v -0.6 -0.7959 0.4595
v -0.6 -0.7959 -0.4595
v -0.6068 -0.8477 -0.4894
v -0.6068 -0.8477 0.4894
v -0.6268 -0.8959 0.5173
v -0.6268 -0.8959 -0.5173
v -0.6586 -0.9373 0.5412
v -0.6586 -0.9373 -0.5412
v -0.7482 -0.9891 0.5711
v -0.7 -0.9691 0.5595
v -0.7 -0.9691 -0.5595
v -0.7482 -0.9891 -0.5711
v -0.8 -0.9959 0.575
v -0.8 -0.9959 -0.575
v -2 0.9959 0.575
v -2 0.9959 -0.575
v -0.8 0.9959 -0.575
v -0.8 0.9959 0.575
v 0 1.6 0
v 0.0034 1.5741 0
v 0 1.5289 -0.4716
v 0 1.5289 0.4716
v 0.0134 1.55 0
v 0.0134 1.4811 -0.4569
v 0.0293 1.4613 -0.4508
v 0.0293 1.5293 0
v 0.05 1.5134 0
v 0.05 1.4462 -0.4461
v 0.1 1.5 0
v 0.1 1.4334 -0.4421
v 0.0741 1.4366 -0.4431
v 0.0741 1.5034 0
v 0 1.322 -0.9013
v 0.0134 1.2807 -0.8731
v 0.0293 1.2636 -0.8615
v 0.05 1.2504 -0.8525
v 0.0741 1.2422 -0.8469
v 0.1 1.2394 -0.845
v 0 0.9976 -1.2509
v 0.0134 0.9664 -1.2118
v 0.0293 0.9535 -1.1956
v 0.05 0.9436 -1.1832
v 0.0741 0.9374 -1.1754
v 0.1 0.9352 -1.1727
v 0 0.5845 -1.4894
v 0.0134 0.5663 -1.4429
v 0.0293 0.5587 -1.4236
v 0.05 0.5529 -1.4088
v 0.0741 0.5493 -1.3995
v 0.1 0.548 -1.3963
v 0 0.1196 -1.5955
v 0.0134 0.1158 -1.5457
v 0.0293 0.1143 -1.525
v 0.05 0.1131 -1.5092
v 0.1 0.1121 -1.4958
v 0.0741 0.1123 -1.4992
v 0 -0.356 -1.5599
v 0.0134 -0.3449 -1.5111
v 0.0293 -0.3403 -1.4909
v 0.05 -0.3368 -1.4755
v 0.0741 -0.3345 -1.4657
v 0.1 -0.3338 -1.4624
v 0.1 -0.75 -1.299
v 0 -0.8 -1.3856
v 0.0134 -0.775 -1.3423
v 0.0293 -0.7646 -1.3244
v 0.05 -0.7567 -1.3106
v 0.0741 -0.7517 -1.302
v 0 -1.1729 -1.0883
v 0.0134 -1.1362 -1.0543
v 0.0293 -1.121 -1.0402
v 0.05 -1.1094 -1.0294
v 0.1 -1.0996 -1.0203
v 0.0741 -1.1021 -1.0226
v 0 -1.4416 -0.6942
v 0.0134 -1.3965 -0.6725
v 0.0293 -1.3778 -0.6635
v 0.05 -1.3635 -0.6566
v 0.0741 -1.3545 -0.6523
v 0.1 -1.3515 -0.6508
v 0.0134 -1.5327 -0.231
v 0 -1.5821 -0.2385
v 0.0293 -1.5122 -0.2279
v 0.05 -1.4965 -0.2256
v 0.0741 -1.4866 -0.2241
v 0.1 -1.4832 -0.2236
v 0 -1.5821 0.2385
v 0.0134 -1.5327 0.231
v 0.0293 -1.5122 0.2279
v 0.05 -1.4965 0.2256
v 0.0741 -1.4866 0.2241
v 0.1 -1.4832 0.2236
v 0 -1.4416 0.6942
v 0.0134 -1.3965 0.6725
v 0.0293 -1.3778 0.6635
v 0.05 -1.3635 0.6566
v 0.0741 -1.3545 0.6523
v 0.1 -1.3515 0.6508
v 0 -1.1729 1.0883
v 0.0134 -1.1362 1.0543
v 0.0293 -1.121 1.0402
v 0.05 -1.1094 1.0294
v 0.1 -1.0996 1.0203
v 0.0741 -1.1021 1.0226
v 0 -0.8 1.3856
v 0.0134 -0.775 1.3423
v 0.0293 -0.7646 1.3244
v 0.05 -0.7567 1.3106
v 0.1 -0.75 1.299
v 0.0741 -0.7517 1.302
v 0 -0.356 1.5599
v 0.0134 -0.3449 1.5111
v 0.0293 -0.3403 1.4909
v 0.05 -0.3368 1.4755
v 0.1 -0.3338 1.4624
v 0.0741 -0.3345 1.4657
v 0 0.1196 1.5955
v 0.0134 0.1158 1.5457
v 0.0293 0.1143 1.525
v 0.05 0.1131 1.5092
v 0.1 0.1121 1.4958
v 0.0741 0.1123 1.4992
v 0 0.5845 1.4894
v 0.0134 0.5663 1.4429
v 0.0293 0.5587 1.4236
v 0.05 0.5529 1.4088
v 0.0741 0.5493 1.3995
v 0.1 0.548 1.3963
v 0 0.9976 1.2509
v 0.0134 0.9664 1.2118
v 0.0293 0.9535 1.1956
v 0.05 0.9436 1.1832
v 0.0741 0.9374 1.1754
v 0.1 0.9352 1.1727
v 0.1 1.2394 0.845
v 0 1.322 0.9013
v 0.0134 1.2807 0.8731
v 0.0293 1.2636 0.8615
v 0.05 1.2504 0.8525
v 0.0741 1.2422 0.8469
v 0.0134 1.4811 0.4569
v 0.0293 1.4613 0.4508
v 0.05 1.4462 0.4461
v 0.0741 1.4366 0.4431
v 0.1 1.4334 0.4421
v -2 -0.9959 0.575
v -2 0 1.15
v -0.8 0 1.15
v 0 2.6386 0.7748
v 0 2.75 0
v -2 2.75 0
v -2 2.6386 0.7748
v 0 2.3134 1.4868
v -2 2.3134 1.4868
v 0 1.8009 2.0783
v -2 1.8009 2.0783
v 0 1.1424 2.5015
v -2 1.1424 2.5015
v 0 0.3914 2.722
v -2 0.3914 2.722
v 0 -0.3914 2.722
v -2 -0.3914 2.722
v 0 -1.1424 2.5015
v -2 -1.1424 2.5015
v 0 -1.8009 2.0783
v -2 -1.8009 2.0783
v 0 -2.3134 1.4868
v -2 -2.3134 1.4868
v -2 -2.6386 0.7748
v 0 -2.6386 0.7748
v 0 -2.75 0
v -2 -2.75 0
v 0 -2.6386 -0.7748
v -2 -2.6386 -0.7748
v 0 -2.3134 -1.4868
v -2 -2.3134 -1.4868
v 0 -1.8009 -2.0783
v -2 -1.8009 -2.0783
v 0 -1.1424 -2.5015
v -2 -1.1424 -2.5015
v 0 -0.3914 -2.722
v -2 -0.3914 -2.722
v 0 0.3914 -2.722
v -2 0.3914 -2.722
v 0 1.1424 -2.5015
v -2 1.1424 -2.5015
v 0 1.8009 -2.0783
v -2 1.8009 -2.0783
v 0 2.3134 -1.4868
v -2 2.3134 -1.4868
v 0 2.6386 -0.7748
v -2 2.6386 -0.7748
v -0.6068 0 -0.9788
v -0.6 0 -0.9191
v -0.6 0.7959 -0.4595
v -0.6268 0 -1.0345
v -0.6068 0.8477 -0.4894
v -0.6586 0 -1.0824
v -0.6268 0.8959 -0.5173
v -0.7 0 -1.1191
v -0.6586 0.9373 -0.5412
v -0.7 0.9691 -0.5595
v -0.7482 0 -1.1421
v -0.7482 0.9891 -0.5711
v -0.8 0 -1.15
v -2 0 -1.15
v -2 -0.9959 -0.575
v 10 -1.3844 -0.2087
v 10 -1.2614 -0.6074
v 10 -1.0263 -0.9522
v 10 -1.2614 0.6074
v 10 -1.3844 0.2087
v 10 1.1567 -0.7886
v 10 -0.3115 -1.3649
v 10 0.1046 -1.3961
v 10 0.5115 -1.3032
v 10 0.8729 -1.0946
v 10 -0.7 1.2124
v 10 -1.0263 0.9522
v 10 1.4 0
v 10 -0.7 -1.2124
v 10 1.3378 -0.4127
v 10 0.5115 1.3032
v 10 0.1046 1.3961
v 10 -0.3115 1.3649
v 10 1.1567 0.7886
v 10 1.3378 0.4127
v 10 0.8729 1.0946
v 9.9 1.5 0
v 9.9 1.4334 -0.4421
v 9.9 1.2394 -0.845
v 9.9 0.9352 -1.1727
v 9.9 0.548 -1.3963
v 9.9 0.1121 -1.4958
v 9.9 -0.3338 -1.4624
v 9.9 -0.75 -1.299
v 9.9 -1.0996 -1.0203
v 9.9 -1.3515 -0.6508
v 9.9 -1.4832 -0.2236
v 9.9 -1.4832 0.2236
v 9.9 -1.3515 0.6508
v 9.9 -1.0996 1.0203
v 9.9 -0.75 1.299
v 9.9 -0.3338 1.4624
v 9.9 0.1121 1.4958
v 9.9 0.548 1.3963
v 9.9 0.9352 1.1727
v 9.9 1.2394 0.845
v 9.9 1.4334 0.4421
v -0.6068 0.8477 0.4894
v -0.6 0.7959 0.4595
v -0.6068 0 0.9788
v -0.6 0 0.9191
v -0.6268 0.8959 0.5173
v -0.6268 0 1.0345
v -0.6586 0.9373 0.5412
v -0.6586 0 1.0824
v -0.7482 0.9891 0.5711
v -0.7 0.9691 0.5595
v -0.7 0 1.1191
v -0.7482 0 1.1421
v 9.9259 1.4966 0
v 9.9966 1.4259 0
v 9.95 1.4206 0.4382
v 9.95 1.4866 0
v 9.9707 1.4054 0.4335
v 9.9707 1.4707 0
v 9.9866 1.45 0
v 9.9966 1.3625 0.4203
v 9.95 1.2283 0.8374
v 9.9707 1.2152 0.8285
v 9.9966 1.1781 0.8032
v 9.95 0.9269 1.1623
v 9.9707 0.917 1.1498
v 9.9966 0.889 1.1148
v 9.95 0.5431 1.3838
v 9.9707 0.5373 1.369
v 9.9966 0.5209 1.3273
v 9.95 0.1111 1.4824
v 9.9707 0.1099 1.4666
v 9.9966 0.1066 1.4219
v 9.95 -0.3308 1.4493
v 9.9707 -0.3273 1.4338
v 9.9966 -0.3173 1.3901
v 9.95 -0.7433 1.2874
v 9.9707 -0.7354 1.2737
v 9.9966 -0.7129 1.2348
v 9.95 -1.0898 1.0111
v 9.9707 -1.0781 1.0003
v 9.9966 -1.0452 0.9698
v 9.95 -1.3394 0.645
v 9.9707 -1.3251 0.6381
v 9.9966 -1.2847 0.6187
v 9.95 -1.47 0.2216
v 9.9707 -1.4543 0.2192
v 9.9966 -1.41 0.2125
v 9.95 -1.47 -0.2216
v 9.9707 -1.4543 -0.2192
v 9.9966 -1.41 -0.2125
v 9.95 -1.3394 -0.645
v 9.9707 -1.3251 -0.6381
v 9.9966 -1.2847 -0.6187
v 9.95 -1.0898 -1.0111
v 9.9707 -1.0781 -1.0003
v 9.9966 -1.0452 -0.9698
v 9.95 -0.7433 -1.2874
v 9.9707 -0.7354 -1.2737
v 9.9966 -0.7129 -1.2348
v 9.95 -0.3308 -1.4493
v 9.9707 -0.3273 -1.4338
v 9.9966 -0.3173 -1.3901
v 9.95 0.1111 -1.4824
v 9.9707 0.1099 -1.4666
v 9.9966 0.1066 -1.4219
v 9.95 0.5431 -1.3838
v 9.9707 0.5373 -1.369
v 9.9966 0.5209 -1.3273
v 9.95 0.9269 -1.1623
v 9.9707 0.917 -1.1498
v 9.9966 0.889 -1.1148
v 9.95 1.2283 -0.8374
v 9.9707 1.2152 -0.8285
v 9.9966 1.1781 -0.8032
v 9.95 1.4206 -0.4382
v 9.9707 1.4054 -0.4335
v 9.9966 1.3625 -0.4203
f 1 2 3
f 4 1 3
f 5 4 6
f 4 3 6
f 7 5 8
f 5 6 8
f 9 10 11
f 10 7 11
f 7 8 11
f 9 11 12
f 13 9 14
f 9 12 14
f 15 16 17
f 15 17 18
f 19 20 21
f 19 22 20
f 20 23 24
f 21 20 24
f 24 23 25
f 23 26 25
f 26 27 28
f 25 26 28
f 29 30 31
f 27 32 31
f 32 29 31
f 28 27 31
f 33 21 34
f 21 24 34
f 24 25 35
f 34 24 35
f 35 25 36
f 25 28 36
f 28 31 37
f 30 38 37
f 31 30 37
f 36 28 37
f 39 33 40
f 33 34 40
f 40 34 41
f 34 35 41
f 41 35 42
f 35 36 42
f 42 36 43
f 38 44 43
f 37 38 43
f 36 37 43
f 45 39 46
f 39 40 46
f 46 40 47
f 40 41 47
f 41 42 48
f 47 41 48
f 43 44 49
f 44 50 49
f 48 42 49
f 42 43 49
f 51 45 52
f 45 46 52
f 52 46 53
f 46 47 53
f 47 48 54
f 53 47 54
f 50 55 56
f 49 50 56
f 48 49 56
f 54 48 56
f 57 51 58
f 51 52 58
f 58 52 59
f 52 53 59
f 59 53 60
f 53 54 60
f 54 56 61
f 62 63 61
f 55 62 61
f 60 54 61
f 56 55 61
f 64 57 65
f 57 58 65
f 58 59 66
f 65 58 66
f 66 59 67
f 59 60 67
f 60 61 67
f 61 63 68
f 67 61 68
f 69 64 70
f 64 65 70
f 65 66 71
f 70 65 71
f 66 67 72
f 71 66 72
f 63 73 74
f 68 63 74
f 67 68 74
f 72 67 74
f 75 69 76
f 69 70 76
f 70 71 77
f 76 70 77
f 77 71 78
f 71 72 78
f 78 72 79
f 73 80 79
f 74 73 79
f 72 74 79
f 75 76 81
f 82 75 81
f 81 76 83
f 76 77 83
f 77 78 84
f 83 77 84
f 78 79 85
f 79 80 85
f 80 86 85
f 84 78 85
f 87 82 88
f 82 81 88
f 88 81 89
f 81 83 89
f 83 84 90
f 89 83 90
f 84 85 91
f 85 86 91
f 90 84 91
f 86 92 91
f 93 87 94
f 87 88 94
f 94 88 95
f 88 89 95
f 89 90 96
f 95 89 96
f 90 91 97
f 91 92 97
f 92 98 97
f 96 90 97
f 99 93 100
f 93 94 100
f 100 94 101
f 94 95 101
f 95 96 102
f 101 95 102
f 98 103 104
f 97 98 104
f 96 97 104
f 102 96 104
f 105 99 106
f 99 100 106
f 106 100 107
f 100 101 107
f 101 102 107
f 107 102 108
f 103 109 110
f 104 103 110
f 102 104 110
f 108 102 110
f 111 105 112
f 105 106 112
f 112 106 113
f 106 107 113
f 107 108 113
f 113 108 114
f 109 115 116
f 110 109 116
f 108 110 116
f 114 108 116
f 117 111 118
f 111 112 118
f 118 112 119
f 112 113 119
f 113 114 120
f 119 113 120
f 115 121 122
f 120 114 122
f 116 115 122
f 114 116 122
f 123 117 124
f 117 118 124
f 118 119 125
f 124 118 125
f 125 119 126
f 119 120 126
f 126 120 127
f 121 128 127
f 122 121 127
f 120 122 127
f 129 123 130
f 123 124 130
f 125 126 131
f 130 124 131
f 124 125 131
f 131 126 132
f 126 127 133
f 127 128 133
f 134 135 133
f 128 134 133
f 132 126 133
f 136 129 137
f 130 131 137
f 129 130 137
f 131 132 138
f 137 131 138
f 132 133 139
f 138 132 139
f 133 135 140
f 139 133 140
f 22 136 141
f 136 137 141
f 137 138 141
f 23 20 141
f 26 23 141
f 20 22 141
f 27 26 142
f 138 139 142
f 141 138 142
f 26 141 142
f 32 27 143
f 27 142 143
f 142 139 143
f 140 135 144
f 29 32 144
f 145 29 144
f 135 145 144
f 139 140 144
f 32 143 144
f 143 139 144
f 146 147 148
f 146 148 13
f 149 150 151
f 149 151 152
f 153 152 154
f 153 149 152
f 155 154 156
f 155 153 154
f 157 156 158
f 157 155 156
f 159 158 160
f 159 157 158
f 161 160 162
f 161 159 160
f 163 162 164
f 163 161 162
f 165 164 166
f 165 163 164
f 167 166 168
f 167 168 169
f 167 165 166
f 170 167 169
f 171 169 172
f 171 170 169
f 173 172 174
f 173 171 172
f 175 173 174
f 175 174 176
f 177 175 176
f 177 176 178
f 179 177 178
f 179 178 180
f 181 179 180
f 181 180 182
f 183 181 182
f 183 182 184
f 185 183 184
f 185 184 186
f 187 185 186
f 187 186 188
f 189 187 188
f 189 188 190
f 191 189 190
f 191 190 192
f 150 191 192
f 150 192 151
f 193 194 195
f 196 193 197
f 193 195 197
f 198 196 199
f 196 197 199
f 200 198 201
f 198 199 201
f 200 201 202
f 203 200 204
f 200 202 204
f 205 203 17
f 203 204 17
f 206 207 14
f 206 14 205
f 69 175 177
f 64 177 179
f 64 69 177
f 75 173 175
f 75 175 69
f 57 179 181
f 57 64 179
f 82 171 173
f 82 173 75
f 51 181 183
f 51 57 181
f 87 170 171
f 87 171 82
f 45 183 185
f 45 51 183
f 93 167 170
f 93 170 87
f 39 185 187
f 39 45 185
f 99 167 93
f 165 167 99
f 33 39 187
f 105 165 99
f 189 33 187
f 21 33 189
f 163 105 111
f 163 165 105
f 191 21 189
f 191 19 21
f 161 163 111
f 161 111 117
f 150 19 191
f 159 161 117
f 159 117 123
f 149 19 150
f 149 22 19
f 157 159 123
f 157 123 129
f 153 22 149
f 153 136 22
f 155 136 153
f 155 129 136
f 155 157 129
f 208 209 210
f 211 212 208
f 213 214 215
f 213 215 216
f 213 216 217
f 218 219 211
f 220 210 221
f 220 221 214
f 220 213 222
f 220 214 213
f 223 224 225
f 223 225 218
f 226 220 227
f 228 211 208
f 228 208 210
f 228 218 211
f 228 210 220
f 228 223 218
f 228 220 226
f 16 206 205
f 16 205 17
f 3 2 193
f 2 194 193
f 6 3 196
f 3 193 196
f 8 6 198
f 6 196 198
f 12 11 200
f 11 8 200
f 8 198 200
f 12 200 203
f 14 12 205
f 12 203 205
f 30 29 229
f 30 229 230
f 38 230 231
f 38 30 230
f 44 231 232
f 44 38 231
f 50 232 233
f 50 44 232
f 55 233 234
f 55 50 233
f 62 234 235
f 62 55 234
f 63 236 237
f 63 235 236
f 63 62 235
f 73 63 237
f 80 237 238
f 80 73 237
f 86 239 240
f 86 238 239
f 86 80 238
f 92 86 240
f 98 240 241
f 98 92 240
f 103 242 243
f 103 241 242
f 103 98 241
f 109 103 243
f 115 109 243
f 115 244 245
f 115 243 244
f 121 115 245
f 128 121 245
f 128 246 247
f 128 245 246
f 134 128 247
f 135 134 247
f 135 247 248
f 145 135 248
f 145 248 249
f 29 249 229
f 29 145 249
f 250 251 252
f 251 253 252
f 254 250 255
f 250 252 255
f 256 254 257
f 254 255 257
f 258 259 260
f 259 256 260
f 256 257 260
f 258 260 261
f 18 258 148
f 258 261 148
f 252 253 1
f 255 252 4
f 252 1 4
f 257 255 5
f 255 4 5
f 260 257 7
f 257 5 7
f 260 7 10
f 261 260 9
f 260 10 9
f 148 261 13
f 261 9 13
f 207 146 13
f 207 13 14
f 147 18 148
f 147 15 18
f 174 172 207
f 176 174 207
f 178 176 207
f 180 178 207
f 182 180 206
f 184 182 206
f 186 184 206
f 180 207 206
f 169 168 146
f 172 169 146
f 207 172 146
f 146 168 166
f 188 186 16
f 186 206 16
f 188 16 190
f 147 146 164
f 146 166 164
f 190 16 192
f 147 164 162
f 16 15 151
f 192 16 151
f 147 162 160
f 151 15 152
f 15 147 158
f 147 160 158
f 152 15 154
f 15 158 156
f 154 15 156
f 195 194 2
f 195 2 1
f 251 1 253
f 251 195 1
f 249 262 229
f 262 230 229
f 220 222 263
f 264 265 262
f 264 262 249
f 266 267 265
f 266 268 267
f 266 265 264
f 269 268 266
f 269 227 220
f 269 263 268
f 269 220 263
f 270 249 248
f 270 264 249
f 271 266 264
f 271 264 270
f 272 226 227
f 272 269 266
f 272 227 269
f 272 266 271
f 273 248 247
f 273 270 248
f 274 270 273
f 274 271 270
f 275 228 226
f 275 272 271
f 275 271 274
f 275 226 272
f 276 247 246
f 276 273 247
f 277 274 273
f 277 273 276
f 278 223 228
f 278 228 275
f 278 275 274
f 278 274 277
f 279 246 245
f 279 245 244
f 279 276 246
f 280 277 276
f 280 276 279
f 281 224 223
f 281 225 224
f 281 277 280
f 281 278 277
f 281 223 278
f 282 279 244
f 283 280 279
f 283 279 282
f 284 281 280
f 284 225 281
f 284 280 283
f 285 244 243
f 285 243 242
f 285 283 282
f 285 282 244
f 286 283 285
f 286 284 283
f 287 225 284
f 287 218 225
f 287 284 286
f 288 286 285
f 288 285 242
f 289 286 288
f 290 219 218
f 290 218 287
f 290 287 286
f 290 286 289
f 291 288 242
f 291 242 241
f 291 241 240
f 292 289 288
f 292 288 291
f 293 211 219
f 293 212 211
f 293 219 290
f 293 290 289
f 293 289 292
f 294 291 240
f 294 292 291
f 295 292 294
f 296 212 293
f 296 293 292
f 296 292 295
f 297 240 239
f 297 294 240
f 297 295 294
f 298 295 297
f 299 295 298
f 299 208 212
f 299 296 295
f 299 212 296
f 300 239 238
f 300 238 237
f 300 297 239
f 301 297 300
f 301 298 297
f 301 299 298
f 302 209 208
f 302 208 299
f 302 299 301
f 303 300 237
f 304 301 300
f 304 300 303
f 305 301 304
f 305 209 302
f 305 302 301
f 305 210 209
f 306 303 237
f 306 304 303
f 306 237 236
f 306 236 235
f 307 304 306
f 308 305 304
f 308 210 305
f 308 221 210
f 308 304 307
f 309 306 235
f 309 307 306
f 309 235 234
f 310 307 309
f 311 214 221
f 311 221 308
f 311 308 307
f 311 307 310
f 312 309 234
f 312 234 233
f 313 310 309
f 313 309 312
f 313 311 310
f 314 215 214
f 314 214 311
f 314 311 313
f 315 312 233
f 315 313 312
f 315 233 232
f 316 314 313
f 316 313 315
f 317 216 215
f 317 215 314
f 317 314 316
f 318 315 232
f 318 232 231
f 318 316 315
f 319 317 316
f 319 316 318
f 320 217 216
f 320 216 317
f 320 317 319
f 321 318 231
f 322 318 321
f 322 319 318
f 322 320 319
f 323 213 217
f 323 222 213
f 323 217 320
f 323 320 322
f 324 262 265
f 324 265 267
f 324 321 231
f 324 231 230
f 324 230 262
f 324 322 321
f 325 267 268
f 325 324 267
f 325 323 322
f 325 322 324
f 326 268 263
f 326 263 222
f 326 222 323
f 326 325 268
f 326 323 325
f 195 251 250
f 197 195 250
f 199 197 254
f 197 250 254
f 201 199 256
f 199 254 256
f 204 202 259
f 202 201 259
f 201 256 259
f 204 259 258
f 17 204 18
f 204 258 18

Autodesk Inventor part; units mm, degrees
ref_plane "YZ Plane" through (0, 0, 0) normal (1, 0, 0) x (0, 1, 0)
ref_plane "XZ Plane" through (0, 0, 0) normal (0, 1, 0) x (-1, 0, 0)
ref_plane "XY Plane" through (0, 0, 0) normal (0, 0, 1) x (1, 0, 0)
sketch "スケッチ1" plane through (0, 0, 0) normal (0, 0, 1) x (1, 0, 0)
  line L0 (0, 0) -> (10, 0)
  line L1 (10, 0) -> (10, 1.5)
  line L2 (10, 1.5) -> (0, 1.5)
  line L3 (0, 1.5) -> (0, 0)
  line L4 (0, 0) -> (0, 2.75)
  line L5 (0, 0) -> (-2, 0)
  line L6 (-2, 0) -> (0, 0)
  line L7 (-2, 0) -> (-2, 1.15)
  line L8 (0, 0) -> (-2, 0)
  line L9 (-2, 0) -> (-2, 2.75)
  line L10 (-2, 2.75) -> (0, 2.75)
  line L11 (0, 2.75) -> (0, 0)
  dimension "d0" = 1.5
  dimension "d1" = 10
  dimension "d3" = 2
  dimension "d4" = 2.75
  dimension "d5" = 1.15
revolve "回転1" add sketch "スケッチ1" angle 360 about axis through (-2, 0, 0) along (1, 0, 0)
thread "ねじ1" size "M3x0.5" class "6g" standard "ANSI Metric M Profile" length 100
sketch "スケッチ2" plane through (-2, 0, 0) normal (-1, 0, 0) x (0, 0, 1)
  circle A0 centre (0, 0) radius 1.15 projected
  line L0 (-0.575, 0.9959) -> (0.575, 0.9959)
  line L1 (0.575, 0.9959) -> (1.15, 0)
  line L2 (1.15, 0) -> (0.575, -0.9959)
  line L3 (0.575, -0.9959) -> (-0.575, -0.9959)
  line L4 (-0.575, -0.9959) -> (-1.15, 0)
  line L5 (-1.15, 0) -> (-0.575, 0.9959)
  dimension "d10" = 1.15
  dimension "d11" = 1.9919
extrude "押し出し1" cut sketch "スケッチ2" against normal blind 1.4 contours L2 L3 L4 L5 L0 L1
fillet "フィレット1" radius 0.2 6 edges at (-0.6, 0.9959, 0) (-0.6, 0.498, 0.8625) (-0.6, 0.498, -0.8625) (-0.6, -0.498, -0.8625) (-0.6, -0.9959, 0) (-0.6, -0.498, 0.8625)
fillet "フィレット2" radius 0.1 1 edges at (0, -1.5, 0)
fillet "フィレット3" radius 0.1 1 edges at (10, -1.5, 0)
properties part number "ネジキャップM3L10" material "鋼"
